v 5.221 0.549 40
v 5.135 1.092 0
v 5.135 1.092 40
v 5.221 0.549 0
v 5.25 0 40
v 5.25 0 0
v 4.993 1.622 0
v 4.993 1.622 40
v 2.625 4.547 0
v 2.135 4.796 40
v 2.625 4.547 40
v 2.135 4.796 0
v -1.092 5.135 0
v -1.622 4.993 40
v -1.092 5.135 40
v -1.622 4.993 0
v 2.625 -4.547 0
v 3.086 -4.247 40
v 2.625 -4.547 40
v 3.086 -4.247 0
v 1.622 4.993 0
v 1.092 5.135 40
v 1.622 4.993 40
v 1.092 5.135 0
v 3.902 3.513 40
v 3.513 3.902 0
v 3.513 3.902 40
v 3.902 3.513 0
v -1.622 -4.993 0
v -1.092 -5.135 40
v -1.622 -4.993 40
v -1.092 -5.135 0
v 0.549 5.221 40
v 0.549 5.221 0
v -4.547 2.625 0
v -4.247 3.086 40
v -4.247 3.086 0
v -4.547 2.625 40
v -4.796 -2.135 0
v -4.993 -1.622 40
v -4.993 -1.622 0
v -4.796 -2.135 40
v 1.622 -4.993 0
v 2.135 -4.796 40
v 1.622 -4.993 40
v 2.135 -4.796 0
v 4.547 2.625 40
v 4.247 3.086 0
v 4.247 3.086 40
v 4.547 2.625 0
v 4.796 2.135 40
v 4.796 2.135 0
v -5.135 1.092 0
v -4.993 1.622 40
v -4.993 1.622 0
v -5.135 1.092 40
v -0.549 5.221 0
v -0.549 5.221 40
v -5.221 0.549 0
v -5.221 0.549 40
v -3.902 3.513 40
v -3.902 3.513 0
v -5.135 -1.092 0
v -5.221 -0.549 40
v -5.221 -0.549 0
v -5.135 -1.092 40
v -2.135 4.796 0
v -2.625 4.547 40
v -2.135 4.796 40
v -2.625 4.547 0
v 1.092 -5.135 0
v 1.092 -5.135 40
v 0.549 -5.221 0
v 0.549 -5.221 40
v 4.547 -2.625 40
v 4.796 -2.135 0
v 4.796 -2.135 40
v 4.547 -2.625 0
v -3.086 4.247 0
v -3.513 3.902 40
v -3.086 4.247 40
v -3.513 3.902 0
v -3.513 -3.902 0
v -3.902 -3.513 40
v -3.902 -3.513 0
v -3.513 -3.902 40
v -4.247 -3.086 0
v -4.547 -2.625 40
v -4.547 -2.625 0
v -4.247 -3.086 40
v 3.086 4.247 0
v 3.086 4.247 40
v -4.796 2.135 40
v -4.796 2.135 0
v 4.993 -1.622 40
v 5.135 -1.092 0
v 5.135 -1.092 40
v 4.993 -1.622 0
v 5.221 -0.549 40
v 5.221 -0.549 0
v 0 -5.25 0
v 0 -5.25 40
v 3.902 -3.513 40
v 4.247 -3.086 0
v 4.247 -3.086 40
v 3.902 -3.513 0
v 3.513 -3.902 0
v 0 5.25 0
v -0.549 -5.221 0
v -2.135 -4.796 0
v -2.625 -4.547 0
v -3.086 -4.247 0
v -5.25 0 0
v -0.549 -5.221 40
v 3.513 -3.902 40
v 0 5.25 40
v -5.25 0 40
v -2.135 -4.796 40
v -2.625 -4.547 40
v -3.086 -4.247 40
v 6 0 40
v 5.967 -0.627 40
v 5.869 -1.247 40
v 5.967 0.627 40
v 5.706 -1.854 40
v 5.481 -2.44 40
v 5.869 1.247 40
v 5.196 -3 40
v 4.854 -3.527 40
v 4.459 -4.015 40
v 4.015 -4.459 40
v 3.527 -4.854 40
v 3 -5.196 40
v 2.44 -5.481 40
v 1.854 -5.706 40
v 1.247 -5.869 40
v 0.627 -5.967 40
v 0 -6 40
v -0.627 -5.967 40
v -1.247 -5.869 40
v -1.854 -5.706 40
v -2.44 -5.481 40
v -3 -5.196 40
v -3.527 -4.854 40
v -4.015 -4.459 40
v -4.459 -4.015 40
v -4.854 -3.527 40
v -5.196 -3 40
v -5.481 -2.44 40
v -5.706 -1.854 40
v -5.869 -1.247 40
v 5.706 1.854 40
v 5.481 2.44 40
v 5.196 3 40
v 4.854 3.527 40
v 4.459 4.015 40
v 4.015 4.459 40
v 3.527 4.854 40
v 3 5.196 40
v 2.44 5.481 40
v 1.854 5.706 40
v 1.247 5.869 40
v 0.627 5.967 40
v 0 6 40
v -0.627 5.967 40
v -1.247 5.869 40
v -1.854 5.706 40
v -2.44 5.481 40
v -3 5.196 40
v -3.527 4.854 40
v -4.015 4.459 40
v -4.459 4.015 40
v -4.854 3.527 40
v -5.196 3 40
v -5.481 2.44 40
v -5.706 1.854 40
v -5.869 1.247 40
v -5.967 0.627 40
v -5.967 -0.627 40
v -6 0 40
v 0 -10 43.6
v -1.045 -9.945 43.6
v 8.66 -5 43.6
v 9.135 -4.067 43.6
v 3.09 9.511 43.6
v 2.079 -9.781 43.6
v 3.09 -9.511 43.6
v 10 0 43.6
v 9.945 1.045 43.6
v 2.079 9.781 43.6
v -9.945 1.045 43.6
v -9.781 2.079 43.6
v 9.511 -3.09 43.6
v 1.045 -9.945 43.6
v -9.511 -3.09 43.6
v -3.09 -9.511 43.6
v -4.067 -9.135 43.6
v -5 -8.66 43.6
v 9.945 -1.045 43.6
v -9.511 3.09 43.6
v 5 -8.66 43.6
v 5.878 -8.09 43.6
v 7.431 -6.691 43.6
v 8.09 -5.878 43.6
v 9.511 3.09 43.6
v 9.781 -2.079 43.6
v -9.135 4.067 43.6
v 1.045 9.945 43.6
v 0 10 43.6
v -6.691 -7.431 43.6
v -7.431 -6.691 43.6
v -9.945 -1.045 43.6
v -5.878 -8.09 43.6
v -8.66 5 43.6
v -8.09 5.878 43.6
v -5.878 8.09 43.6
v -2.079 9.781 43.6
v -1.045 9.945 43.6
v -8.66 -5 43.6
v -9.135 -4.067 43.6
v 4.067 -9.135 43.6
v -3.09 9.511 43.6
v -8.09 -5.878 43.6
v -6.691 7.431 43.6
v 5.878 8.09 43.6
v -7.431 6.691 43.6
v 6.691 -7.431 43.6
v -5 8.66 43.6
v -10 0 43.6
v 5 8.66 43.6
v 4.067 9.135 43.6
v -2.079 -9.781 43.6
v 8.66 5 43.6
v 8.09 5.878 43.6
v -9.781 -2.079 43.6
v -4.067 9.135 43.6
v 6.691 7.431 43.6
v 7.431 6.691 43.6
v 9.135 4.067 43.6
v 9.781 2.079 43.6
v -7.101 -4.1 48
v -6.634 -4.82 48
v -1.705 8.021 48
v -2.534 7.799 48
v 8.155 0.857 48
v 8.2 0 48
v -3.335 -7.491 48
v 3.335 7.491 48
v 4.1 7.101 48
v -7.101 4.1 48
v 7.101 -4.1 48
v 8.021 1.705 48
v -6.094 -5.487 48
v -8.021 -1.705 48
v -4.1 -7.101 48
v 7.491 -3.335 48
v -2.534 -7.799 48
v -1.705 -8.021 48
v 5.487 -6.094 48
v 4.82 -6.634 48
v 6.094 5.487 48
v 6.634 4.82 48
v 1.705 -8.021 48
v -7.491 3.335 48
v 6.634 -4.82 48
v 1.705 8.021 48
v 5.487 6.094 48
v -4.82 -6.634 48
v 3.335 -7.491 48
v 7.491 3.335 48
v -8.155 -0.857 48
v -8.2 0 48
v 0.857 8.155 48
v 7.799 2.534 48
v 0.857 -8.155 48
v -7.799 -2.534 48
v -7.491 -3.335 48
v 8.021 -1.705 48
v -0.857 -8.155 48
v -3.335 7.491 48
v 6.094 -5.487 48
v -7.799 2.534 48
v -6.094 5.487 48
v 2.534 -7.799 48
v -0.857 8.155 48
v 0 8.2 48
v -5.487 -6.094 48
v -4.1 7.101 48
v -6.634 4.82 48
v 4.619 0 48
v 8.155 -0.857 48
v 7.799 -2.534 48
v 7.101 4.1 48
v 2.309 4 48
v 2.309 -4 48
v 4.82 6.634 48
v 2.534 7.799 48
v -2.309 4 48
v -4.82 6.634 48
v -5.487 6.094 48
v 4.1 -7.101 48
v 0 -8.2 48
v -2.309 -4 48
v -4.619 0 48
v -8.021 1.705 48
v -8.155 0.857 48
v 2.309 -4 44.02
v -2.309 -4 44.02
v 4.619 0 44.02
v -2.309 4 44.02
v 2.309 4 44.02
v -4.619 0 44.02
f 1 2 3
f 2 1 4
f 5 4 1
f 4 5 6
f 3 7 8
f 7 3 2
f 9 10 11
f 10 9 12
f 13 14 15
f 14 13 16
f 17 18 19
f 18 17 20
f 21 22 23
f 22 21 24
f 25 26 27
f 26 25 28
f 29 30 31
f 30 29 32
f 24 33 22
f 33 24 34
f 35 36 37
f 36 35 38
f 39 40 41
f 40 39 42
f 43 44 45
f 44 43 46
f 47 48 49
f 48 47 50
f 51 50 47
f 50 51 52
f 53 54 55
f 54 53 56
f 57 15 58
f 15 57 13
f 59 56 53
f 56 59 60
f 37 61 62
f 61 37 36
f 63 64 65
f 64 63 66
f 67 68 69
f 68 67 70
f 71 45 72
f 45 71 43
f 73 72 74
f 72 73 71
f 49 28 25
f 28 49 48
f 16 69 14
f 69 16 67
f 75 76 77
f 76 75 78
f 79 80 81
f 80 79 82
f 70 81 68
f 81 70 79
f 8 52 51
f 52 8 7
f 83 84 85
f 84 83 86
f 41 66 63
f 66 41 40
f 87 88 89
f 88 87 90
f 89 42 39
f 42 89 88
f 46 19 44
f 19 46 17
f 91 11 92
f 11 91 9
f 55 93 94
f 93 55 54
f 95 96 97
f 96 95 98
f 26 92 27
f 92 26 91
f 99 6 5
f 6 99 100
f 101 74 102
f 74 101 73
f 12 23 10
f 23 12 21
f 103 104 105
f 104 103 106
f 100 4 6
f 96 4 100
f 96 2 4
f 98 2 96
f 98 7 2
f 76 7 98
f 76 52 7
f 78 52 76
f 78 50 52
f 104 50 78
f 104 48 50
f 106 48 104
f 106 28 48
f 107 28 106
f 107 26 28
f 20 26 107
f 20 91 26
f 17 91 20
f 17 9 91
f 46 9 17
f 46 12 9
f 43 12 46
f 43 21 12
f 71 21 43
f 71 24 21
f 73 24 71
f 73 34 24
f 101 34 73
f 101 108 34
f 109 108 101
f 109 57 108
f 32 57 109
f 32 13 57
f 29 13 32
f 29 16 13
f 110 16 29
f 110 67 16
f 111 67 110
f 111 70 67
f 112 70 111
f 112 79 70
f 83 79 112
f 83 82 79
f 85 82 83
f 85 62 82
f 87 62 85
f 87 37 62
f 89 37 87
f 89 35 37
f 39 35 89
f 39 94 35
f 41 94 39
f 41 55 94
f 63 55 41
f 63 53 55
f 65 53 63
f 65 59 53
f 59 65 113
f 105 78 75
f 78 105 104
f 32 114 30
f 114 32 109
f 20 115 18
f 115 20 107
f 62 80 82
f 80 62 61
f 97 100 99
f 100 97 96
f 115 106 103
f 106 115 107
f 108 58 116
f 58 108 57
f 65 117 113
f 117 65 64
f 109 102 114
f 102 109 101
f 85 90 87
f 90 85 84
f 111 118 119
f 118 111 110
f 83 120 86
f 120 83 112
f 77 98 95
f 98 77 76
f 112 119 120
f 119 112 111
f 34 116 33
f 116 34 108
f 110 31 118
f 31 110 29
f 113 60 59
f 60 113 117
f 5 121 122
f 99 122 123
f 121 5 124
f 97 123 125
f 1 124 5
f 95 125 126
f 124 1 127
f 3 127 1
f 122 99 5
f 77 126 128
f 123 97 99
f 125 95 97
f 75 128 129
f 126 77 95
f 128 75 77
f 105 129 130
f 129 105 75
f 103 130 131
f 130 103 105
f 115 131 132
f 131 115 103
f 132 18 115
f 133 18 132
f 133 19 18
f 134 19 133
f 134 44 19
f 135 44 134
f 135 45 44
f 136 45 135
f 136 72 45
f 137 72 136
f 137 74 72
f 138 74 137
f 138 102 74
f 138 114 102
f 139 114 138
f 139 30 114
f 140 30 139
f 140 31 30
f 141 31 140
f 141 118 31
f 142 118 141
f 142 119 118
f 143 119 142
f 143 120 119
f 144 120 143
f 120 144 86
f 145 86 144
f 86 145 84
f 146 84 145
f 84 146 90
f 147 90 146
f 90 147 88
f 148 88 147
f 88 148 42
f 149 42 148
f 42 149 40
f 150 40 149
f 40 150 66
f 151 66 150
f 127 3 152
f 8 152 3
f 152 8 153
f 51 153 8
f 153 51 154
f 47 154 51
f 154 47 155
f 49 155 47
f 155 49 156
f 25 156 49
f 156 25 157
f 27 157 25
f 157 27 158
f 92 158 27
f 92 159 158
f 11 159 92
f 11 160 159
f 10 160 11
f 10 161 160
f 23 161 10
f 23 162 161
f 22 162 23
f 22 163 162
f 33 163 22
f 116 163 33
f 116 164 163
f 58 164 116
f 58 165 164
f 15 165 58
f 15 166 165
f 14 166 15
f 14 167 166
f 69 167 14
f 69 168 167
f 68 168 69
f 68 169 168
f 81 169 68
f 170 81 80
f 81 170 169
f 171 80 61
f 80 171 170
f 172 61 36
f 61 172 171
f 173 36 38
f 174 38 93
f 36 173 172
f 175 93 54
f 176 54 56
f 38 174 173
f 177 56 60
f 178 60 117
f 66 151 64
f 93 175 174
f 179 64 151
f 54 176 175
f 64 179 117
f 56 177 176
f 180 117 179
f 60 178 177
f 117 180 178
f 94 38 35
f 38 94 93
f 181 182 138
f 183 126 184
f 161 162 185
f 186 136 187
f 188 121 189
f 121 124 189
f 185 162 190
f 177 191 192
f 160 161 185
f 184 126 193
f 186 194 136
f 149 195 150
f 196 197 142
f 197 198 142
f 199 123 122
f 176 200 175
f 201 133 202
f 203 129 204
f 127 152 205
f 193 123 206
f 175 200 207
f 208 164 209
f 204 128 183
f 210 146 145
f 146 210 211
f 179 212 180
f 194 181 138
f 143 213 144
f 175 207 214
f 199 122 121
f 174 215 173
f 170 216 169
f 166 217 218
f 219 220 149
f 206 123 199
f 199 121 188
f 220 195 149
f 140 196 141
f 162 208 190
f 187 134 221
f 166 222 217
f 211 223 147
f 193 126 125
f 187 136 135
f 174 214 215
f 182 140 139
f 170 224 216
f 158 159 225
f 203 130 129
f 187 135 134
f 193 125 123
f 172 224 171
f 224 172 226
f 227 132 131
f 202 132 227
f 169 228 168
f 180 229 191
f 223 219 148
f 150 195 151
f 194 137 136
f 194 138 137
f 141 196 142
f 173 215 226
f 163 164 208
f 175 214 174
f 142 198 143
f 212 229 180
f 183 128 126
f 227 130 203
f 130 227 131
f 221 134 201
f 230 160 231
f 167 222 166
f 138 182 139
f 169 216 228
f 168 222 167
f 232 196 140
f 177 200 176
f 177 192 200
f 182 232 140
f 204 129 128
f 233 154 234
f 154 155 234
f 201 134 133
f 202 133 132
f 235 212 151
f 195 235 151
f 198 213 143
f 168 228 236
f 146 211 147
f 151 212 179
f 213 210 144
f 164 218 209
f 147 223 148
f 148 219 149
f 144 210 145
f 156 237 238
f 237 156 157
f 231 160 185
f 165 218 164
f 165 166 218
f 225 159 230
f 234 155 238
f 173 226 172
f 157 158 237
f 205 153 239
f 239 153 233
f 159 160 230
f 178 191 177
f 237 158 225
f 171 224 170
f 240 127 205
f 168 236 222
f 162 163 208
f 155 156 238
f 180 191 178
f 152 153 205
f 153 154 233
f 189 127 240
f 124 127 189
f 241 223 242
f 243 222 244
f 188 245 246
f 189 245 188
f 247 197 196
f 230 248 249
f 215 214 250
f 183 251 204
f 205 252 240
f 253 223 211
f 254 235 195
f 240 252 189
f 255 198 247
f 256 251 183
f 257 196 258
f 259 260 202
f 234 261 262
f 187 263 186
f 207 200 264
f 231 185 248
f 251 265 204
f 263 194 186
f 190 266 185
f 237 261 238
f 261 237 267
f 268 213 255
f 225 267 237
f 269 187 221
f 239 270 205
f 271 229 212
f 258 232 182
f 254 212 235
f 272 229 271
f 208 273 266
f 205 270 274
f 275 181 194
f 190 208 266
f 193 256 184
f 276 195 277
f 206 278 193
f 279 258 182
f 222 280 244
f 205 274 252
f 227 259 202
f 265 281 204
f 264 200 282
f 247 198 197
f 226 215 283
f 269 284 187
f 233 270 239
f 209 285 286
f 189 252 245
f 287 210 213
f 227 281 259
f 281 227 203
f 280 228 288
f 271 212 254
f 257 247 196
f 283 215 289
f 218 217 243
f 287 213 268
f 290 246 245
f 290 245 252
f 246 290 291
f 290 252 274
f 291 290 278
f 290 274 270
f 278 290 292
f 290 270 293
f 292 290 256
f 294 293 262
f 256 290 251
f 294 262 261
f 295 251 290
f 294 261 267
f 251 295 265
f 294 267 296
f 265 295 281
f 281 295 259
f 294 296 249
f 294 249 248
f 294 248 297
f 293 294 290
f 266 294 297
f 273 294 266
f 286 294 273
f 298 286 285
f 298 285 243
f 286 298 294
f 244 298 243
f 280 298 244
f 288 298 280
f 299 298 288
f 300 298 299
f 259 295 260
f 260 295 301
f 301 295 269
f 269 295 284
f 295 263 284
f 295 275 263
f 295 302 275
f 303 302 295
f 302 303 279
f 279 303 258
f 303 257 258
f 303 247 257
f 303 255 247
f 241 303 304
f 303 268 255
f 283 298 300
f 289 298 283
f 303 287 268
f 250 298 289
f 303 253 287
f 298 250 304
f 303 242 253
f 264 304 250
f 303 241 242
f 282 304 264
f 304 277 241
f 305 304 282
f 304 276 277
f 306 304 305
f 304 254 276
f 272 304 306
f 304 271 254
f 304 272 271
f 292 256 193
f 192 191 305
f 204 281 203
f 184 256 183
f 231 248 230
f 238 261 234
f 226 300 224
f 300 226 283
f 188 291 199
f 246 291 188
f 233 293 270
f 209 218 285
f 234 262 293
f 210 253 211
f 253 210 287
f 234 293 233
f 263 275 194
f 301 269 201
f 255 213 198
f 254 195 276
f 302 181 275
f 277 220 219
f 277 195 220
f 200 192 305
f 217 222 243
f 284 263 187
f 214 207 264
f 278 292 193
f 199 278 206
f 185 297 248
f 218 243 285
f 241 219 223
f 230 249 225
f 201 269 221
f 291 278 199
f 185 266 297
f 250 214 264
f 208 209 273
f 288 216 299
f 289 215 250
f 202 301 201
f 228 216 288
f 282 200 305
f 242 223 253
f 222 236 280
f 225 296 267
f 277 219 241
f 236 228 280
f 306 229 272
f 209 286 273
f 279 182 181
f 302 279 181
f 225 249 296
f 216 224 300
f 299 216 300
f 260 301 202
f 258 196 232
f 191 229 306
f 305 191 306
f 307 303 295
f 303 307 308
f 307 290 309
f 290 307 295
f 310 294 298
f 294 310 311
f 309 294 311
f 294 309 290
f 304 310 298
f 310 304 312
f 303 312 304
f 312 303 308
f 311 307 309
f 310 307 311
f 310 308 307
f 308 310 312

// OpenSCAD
// Low-profile button-head screw.
$fn = 60;
eps = 0.02;
shaft_d = 10.5;
head_d = 20;
head_h = 8;
shaft_l = 40;
socket_flat = head_d * 0.40;
difference() {
    union() {
        cylinder(d = shaft_d, h = shaft_l);
        translate([0, 0, shaft_l]) cylinder(d1 = shaft_d + 1.5, d2 = head_d, h = head_h * 0.45);
        translate([0, 0, shaft_l + head_h * 0.45]) cylinder(d1 = head_d, d2 = head_d * 0.82, h = head_h * 0.55);
    }
    translate([0, 0, shaft_l + head_h - head_h * 0.5 + eps])
        cylinder(d = socket_flat / cos(30), h = head_h * 0.5 + eps, $fn = 6);
}
